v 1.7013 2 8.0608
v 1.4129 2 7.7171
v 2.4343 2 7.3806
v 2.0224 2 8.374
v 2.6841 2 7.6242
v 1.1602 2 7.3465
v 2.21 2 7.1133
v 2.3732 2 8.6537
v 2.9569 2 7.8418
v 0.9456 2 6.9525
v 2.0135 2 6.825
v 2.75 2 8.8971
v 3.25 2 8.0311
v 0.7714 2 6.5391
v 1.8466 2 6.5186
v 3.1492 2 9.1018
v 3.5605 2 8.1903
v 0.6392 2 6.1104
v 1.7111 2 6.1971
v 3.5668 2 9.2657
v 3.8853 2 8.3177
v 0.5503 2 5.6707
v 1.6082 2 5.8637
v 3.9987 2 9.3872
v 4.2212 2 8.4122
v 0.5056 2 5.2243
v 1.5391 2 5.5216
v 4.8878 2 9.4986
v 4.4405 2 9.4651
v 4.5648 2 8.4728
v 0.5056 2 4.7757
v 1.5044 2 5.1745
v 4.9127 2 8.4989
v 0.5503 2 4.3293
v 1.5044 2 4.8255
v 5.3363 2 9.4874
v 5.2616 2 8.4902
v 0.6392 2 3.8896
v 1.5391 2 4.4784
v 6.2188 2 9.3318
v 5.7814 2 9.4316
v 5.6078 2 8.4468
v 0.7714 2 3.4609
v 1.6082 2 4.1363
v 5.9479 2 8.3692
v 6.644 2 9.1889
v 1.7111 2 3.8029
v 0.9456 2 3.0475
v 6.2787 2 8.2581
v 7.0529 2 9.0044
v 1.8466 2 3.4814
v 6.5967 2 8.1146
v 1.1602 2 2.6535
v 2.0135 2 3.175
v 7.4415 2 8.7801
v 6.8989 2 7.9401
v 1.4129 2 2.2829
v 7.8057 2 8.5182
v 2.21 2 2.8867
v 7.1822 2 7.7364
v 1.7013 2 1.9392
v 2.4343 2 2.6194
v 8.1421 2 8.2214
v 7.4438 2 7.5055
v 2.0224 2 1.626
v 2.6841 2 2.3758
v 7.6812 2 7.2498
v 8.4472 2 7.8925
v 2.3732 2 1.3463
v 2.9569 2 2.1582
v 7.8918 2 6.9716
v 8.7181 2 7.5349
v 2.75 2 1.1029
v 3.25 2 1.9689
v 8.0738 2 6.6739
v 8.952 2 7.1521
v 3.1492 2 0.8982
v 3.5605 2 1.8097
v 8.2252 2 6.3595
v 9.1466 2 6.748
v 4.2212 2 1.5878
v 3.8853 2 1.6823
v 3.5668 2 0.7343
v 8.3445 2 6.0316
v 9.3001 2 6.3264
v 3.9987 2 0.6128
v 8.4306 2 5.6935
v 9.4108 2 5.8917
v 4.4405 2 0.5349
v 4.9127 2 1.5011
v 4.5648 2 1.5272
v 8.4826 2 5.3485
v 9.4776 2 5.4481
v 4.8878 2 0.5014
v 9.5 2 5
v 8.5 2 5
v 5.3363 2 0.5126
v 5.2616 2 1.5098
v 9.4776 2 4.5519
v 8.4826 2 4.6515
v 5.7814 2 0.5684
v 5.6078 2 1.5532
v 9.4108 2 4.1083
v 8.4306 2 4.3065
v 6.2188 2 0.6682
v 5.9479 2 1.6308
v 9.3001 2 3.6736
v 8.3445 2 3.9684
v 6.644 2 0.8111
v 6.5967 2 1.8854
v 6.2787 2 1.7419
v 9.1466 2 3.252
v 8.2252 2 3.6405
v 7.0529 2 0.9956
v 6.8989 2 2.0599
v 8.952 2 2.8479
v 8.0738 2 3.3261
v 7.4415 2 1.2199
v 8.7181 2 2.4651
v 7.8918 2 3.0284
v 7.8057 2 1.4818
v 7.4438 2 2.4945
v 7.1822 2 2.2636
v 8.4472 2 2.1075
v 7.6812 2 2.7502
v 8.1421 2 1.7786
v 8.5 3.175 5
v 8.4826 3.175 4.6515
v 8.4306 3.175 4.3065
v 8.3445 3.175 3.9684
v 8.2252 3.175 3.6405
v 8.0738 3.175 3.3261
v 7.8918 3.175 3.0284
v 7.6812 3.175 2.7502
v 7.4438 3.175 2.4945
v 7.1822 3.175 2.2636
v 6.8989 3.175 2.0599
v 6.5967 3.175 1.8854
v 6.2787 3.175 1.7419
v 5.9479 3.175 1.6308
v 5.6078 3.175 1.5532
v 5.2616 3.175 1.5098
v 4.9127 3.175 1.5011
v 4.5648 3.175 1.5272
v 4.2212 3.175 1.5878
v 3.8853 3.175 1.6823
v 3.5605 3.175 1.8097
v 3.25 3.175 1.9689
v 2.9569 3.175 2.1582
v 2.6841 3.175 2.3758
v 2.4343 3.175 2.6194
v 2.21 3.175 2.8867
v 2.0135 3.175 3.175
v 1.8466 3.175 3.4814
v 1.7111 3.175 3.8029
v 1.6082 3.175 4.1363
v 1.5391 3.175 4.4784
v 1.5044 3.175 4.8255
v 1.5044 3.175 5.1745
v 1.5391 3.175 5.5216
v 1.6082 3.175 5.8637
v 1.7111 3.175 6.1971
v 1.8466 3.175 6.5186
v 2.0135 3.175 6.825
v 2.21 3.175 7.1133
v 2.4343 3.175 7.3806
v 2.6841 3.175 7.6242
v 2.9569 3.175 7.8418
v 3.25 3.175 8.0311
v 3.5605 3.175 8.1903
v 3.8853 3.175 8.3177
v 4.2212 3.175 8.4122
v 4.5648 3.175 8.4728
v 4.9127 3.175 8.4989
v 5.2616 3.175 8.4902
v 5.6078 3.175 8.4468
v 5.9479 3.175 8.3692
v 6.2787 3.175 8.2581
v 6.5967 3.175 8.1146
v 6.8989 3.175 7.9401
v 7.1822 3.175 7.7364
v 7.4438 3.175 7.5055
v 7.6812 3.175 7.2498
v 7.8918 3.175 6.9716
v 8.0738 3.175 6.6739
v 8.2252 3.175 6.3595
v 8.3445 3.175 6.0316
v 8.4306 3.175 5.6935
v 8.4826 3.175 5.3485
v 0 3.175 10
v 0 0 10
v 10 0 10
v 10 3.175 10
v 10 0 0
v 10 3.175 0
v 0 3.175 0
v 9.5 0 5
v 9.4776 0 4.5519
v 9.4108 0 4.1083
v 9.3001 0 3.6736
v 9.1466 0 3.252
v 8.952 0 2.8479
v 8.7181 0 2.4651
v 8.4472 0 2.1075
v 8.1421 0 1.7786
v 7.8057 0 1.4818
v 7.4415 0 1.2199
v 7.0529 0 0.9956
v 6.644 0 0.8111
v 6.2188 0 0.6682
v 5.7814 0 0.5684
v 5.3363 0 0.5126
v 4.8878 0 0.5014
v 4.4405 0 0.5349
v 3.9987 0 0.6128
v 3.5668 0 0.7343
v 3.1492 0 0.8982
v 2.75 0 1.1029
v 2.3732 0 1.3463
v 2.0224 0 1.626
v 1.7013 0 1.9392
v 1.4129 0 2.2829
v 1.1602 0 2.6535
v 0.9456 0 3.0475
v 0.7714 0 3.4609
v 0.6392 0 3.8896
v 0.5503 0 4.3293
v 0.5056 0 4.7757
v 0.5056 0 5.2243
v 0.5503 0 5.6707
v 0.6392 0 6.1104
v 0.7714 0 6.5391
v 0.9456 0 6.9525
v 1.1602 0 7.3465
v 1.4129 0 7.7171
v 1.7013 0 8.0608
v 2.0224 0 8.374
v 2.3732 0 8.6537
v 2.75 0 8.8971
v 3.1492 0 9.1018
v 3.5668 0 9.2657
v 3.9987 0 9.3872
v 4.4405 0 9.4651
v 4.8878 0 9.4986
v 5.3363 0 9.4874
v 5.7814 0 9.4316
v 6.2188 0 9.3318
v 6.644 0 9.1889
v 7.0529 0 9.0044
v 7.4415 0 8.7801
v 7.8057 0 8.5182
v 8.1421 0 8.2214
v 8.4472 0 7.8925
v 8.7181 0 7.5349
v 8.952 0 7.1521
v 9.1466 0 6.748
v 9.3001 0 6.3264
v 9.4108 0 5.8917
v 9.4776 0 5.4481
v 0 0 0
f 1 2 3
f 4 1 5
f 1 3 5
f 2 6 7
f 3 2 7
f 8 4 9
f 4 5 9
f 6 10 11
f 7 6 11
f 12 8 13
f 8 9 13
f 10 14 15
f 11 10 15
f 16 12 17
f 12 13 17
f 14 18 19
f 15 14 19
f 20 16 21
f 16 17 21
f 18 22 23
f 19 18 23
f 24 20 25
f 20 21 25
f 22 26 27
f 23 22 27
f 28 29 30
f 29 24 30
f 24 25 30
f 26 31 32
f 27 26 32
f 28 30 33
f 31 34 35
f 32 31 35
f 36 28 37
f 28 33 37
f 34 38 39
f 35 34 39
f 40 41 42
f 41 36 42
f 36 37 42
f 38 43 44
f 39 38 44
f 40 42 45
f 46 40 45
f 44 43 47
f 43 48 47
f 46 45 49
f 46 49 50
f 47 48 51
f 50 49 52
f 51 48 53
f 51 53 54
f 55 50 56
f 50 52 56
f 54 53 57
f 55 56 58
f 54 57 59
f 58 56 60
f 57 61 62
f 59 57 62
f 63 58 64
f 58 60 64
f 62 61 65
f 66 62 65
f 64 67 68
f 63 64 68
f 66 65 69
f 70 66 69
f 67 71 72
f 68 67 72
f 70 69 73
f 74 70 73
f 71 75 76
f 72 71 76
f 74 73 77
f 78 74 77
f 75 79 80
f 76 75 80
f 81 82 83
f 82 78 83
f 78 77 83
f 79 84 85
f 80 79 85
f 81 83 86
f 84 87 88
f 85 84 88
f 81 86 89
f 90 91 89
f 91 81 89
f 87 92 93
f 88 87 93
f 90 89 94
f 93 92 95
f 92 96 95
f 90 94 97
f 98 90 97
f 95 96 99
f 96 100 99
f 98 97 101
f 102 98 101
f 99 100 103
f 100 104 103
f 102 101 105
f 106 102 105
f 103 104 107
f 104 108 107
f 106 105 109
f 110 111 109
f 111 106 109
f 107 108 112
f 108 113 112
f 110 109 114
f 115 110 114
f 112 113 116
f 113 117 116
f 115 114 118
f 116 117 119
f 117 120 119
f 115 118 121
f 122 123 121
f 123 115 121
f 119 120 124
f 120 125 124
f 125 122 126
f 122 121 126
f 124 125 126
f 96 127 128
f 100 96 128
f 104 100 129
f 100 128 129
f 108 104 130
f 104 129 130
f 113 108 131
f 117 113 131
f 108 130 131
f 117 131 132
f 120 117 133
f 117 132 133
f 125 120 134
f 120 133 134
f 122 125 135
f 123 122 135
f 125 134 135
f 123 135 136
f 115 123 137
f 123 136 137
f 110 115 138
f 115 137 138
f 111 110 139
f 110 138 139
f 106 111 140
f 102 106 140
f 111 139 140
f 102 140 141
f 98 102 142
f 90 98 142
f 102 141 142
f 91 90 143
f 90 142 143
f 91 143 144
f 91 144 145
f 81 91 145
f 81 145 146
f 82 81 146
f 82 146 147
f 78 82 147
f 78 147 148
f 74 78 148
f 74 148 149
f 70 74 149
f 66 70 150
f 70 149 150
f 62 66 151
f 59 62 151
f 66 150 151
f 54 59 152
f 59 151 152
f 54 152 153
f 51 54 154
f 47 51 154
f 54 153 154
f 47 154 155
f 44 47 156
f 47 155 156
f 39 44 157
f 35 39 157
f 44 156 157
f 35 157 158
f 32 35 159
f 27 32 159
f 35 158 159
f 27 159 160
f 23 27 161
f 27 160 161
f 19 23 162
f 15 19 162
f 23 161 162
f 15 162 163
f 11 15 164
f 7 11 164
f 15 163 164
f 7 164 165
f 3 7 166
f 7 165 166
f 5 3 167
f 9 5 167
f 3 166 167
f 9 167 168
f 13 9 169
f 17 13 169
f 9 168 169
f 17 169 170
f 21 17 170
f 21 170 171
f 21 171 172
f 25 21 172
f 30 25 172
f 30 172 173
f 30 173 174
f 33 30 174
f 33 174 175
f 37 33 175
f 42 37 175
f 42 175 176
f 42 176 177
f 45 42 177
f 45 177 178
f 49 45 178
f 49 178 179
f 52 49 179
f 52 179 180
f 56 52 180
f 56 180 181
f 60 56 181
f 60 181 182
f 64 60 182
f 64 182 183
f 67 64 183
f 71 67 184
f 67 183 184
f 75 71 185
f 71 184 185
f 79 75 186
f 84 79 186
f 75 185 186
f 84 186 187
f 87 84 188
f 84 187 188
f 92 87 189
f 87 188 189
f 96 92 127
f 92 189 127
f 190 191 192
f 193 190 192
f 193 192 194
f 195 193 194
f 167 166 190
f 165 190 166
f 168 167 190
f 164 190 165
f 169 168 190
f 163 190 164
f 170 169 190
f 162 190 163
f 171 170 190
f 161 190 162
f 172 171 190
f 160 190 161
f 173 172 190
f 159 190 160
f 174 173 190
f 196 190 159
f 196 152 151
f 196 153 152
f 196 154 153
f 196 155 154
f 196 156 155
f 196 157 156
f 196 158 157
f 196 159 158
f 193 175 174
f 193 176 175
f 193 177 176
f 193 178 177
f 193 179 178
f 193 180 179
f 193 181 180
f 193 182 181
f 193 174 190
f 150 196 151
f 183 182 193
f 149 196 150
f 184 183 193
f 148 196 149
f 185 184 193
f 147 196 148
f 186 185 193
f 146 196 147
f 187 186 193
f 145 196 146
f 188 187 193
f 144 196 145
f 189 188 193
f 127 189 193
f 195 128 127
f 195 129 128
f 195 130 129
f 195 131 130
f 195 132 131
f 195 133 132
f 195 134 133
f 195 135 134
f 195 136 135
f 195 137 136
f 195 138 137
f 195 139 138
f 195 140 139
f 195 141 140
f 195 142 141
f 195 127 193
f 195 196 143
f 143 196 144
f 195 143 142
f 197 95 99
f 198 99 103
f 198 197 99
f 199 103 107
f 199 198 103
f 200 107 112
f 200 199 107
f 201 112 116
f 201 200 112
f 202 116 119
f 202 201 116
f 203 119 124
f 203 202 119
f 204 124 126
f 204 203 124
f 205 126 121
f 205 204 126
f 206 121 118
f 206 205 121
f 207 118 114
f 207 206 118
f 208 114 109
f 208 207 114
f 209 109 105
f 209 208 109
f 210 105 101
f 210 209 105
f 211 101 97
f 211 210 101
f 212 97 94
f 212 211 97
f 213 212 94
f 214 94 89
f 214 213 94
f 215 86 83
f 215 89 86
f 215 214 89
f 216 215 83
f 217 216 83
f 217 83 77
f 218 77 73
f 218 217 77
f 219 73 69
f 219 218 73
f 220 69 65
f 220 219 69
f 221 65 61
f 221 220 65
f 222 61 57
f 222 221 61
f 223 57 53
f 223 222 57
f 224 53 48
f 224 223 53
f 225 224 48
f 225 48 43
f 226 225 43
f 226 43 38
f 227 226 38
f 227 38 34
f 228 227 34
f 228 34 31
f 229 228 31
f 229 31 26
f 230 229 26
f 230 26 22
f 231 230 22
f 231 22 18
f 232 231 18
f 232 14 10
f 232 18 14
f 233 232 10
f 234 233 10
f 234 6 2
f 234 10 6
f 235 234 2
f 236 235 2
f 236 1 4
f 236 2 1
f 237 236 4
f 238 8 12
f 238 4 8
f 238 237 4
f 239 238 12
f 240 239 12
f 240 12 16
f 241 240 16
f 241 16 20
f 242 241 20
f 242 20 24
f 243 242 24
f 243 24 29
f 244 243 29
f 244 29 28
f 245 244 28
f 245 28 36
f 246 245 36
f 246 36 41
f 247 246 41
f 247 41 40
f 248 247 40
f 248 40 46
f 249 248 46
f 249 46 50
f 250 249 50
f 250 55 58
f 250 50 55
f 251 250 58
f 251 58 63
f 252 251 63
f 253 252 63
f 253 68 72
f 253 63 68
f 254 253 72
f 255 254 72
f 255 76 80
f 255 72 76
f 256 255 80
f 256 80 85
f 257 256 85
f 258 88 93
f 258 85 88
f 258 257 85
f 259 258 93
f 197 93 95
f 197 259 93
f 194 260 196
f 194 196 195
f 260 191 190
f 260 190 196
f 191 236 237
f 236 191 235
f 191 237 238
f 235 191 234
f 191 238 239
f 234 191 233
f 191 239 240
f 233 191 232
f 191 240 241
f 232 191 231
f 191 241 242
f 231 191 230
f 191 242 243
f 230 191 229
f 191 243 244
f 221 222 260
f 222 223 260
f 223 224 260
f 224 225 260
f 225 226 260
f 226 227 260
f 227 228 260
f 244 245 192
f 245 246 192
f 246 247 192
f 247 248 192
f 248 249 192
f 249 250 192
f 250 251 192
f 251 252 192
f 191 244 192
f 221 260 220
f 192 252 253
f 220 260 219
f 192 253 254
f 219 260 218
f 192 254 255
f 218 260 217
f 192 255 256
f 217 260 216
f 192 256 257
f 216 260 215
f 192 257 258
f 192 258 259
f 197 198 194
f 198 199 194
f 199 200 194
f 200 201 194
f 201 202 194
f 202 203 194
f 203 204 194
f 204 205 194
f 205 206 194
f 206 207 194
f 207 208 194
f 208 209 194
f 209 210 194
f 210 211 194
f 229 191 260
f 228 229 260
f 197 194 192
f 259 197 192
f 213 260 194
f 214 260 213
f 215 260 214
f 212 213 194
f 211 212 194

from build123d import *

# Parameters (mm, degrees)
SKETCH1_W           = 10
SKETCH1_H           = 10
SKETCH1_R           = 4.5
BOSS_EXTRUDE1_DEPTH = 3.175
SKETCH2_W           = 10
SKETCH2_H           = 10
SKETCH2_R           = 3.5
BOSS_EXTRUDE2_DEPTH = 1.175


with BuildPart() as part:
    # Sketch1 → Boss-Extrude1 (new body)
    with BuildSketch(Plane(origin=(0, 0, 0), x_dir=(1, 0, 0), z_dir=(0, 1, 0))):
        with Locations((5, -5)):
            Rectangle(SKETCH1_W, SKETCH1_H)
        with Locations((5, -5)):
            Circle(SKETCH1_R, mode=Mode.SUBTRACT)
    extrude(amount=BOSS_EXTRUDE1_DEPTH)

    # Sketch2 → Boss-Extrude2 (add)
    with BuildSketch(Plane(origin=(0, 3.175, 0), x_dir=(1, 0, 0), z_dir=(0, 1, 0))):
        with Locations((5, -5)):
            Rectangle(SKETCH2_W, SKETCH2_H)
        with Locations((5, -5)):
            Circle(SKETCH2_R, mode=Mode.SUBTRACT)
    extrude(amount=-BOSS_EXTRUDE2_DEPTH)


solid = part.part
